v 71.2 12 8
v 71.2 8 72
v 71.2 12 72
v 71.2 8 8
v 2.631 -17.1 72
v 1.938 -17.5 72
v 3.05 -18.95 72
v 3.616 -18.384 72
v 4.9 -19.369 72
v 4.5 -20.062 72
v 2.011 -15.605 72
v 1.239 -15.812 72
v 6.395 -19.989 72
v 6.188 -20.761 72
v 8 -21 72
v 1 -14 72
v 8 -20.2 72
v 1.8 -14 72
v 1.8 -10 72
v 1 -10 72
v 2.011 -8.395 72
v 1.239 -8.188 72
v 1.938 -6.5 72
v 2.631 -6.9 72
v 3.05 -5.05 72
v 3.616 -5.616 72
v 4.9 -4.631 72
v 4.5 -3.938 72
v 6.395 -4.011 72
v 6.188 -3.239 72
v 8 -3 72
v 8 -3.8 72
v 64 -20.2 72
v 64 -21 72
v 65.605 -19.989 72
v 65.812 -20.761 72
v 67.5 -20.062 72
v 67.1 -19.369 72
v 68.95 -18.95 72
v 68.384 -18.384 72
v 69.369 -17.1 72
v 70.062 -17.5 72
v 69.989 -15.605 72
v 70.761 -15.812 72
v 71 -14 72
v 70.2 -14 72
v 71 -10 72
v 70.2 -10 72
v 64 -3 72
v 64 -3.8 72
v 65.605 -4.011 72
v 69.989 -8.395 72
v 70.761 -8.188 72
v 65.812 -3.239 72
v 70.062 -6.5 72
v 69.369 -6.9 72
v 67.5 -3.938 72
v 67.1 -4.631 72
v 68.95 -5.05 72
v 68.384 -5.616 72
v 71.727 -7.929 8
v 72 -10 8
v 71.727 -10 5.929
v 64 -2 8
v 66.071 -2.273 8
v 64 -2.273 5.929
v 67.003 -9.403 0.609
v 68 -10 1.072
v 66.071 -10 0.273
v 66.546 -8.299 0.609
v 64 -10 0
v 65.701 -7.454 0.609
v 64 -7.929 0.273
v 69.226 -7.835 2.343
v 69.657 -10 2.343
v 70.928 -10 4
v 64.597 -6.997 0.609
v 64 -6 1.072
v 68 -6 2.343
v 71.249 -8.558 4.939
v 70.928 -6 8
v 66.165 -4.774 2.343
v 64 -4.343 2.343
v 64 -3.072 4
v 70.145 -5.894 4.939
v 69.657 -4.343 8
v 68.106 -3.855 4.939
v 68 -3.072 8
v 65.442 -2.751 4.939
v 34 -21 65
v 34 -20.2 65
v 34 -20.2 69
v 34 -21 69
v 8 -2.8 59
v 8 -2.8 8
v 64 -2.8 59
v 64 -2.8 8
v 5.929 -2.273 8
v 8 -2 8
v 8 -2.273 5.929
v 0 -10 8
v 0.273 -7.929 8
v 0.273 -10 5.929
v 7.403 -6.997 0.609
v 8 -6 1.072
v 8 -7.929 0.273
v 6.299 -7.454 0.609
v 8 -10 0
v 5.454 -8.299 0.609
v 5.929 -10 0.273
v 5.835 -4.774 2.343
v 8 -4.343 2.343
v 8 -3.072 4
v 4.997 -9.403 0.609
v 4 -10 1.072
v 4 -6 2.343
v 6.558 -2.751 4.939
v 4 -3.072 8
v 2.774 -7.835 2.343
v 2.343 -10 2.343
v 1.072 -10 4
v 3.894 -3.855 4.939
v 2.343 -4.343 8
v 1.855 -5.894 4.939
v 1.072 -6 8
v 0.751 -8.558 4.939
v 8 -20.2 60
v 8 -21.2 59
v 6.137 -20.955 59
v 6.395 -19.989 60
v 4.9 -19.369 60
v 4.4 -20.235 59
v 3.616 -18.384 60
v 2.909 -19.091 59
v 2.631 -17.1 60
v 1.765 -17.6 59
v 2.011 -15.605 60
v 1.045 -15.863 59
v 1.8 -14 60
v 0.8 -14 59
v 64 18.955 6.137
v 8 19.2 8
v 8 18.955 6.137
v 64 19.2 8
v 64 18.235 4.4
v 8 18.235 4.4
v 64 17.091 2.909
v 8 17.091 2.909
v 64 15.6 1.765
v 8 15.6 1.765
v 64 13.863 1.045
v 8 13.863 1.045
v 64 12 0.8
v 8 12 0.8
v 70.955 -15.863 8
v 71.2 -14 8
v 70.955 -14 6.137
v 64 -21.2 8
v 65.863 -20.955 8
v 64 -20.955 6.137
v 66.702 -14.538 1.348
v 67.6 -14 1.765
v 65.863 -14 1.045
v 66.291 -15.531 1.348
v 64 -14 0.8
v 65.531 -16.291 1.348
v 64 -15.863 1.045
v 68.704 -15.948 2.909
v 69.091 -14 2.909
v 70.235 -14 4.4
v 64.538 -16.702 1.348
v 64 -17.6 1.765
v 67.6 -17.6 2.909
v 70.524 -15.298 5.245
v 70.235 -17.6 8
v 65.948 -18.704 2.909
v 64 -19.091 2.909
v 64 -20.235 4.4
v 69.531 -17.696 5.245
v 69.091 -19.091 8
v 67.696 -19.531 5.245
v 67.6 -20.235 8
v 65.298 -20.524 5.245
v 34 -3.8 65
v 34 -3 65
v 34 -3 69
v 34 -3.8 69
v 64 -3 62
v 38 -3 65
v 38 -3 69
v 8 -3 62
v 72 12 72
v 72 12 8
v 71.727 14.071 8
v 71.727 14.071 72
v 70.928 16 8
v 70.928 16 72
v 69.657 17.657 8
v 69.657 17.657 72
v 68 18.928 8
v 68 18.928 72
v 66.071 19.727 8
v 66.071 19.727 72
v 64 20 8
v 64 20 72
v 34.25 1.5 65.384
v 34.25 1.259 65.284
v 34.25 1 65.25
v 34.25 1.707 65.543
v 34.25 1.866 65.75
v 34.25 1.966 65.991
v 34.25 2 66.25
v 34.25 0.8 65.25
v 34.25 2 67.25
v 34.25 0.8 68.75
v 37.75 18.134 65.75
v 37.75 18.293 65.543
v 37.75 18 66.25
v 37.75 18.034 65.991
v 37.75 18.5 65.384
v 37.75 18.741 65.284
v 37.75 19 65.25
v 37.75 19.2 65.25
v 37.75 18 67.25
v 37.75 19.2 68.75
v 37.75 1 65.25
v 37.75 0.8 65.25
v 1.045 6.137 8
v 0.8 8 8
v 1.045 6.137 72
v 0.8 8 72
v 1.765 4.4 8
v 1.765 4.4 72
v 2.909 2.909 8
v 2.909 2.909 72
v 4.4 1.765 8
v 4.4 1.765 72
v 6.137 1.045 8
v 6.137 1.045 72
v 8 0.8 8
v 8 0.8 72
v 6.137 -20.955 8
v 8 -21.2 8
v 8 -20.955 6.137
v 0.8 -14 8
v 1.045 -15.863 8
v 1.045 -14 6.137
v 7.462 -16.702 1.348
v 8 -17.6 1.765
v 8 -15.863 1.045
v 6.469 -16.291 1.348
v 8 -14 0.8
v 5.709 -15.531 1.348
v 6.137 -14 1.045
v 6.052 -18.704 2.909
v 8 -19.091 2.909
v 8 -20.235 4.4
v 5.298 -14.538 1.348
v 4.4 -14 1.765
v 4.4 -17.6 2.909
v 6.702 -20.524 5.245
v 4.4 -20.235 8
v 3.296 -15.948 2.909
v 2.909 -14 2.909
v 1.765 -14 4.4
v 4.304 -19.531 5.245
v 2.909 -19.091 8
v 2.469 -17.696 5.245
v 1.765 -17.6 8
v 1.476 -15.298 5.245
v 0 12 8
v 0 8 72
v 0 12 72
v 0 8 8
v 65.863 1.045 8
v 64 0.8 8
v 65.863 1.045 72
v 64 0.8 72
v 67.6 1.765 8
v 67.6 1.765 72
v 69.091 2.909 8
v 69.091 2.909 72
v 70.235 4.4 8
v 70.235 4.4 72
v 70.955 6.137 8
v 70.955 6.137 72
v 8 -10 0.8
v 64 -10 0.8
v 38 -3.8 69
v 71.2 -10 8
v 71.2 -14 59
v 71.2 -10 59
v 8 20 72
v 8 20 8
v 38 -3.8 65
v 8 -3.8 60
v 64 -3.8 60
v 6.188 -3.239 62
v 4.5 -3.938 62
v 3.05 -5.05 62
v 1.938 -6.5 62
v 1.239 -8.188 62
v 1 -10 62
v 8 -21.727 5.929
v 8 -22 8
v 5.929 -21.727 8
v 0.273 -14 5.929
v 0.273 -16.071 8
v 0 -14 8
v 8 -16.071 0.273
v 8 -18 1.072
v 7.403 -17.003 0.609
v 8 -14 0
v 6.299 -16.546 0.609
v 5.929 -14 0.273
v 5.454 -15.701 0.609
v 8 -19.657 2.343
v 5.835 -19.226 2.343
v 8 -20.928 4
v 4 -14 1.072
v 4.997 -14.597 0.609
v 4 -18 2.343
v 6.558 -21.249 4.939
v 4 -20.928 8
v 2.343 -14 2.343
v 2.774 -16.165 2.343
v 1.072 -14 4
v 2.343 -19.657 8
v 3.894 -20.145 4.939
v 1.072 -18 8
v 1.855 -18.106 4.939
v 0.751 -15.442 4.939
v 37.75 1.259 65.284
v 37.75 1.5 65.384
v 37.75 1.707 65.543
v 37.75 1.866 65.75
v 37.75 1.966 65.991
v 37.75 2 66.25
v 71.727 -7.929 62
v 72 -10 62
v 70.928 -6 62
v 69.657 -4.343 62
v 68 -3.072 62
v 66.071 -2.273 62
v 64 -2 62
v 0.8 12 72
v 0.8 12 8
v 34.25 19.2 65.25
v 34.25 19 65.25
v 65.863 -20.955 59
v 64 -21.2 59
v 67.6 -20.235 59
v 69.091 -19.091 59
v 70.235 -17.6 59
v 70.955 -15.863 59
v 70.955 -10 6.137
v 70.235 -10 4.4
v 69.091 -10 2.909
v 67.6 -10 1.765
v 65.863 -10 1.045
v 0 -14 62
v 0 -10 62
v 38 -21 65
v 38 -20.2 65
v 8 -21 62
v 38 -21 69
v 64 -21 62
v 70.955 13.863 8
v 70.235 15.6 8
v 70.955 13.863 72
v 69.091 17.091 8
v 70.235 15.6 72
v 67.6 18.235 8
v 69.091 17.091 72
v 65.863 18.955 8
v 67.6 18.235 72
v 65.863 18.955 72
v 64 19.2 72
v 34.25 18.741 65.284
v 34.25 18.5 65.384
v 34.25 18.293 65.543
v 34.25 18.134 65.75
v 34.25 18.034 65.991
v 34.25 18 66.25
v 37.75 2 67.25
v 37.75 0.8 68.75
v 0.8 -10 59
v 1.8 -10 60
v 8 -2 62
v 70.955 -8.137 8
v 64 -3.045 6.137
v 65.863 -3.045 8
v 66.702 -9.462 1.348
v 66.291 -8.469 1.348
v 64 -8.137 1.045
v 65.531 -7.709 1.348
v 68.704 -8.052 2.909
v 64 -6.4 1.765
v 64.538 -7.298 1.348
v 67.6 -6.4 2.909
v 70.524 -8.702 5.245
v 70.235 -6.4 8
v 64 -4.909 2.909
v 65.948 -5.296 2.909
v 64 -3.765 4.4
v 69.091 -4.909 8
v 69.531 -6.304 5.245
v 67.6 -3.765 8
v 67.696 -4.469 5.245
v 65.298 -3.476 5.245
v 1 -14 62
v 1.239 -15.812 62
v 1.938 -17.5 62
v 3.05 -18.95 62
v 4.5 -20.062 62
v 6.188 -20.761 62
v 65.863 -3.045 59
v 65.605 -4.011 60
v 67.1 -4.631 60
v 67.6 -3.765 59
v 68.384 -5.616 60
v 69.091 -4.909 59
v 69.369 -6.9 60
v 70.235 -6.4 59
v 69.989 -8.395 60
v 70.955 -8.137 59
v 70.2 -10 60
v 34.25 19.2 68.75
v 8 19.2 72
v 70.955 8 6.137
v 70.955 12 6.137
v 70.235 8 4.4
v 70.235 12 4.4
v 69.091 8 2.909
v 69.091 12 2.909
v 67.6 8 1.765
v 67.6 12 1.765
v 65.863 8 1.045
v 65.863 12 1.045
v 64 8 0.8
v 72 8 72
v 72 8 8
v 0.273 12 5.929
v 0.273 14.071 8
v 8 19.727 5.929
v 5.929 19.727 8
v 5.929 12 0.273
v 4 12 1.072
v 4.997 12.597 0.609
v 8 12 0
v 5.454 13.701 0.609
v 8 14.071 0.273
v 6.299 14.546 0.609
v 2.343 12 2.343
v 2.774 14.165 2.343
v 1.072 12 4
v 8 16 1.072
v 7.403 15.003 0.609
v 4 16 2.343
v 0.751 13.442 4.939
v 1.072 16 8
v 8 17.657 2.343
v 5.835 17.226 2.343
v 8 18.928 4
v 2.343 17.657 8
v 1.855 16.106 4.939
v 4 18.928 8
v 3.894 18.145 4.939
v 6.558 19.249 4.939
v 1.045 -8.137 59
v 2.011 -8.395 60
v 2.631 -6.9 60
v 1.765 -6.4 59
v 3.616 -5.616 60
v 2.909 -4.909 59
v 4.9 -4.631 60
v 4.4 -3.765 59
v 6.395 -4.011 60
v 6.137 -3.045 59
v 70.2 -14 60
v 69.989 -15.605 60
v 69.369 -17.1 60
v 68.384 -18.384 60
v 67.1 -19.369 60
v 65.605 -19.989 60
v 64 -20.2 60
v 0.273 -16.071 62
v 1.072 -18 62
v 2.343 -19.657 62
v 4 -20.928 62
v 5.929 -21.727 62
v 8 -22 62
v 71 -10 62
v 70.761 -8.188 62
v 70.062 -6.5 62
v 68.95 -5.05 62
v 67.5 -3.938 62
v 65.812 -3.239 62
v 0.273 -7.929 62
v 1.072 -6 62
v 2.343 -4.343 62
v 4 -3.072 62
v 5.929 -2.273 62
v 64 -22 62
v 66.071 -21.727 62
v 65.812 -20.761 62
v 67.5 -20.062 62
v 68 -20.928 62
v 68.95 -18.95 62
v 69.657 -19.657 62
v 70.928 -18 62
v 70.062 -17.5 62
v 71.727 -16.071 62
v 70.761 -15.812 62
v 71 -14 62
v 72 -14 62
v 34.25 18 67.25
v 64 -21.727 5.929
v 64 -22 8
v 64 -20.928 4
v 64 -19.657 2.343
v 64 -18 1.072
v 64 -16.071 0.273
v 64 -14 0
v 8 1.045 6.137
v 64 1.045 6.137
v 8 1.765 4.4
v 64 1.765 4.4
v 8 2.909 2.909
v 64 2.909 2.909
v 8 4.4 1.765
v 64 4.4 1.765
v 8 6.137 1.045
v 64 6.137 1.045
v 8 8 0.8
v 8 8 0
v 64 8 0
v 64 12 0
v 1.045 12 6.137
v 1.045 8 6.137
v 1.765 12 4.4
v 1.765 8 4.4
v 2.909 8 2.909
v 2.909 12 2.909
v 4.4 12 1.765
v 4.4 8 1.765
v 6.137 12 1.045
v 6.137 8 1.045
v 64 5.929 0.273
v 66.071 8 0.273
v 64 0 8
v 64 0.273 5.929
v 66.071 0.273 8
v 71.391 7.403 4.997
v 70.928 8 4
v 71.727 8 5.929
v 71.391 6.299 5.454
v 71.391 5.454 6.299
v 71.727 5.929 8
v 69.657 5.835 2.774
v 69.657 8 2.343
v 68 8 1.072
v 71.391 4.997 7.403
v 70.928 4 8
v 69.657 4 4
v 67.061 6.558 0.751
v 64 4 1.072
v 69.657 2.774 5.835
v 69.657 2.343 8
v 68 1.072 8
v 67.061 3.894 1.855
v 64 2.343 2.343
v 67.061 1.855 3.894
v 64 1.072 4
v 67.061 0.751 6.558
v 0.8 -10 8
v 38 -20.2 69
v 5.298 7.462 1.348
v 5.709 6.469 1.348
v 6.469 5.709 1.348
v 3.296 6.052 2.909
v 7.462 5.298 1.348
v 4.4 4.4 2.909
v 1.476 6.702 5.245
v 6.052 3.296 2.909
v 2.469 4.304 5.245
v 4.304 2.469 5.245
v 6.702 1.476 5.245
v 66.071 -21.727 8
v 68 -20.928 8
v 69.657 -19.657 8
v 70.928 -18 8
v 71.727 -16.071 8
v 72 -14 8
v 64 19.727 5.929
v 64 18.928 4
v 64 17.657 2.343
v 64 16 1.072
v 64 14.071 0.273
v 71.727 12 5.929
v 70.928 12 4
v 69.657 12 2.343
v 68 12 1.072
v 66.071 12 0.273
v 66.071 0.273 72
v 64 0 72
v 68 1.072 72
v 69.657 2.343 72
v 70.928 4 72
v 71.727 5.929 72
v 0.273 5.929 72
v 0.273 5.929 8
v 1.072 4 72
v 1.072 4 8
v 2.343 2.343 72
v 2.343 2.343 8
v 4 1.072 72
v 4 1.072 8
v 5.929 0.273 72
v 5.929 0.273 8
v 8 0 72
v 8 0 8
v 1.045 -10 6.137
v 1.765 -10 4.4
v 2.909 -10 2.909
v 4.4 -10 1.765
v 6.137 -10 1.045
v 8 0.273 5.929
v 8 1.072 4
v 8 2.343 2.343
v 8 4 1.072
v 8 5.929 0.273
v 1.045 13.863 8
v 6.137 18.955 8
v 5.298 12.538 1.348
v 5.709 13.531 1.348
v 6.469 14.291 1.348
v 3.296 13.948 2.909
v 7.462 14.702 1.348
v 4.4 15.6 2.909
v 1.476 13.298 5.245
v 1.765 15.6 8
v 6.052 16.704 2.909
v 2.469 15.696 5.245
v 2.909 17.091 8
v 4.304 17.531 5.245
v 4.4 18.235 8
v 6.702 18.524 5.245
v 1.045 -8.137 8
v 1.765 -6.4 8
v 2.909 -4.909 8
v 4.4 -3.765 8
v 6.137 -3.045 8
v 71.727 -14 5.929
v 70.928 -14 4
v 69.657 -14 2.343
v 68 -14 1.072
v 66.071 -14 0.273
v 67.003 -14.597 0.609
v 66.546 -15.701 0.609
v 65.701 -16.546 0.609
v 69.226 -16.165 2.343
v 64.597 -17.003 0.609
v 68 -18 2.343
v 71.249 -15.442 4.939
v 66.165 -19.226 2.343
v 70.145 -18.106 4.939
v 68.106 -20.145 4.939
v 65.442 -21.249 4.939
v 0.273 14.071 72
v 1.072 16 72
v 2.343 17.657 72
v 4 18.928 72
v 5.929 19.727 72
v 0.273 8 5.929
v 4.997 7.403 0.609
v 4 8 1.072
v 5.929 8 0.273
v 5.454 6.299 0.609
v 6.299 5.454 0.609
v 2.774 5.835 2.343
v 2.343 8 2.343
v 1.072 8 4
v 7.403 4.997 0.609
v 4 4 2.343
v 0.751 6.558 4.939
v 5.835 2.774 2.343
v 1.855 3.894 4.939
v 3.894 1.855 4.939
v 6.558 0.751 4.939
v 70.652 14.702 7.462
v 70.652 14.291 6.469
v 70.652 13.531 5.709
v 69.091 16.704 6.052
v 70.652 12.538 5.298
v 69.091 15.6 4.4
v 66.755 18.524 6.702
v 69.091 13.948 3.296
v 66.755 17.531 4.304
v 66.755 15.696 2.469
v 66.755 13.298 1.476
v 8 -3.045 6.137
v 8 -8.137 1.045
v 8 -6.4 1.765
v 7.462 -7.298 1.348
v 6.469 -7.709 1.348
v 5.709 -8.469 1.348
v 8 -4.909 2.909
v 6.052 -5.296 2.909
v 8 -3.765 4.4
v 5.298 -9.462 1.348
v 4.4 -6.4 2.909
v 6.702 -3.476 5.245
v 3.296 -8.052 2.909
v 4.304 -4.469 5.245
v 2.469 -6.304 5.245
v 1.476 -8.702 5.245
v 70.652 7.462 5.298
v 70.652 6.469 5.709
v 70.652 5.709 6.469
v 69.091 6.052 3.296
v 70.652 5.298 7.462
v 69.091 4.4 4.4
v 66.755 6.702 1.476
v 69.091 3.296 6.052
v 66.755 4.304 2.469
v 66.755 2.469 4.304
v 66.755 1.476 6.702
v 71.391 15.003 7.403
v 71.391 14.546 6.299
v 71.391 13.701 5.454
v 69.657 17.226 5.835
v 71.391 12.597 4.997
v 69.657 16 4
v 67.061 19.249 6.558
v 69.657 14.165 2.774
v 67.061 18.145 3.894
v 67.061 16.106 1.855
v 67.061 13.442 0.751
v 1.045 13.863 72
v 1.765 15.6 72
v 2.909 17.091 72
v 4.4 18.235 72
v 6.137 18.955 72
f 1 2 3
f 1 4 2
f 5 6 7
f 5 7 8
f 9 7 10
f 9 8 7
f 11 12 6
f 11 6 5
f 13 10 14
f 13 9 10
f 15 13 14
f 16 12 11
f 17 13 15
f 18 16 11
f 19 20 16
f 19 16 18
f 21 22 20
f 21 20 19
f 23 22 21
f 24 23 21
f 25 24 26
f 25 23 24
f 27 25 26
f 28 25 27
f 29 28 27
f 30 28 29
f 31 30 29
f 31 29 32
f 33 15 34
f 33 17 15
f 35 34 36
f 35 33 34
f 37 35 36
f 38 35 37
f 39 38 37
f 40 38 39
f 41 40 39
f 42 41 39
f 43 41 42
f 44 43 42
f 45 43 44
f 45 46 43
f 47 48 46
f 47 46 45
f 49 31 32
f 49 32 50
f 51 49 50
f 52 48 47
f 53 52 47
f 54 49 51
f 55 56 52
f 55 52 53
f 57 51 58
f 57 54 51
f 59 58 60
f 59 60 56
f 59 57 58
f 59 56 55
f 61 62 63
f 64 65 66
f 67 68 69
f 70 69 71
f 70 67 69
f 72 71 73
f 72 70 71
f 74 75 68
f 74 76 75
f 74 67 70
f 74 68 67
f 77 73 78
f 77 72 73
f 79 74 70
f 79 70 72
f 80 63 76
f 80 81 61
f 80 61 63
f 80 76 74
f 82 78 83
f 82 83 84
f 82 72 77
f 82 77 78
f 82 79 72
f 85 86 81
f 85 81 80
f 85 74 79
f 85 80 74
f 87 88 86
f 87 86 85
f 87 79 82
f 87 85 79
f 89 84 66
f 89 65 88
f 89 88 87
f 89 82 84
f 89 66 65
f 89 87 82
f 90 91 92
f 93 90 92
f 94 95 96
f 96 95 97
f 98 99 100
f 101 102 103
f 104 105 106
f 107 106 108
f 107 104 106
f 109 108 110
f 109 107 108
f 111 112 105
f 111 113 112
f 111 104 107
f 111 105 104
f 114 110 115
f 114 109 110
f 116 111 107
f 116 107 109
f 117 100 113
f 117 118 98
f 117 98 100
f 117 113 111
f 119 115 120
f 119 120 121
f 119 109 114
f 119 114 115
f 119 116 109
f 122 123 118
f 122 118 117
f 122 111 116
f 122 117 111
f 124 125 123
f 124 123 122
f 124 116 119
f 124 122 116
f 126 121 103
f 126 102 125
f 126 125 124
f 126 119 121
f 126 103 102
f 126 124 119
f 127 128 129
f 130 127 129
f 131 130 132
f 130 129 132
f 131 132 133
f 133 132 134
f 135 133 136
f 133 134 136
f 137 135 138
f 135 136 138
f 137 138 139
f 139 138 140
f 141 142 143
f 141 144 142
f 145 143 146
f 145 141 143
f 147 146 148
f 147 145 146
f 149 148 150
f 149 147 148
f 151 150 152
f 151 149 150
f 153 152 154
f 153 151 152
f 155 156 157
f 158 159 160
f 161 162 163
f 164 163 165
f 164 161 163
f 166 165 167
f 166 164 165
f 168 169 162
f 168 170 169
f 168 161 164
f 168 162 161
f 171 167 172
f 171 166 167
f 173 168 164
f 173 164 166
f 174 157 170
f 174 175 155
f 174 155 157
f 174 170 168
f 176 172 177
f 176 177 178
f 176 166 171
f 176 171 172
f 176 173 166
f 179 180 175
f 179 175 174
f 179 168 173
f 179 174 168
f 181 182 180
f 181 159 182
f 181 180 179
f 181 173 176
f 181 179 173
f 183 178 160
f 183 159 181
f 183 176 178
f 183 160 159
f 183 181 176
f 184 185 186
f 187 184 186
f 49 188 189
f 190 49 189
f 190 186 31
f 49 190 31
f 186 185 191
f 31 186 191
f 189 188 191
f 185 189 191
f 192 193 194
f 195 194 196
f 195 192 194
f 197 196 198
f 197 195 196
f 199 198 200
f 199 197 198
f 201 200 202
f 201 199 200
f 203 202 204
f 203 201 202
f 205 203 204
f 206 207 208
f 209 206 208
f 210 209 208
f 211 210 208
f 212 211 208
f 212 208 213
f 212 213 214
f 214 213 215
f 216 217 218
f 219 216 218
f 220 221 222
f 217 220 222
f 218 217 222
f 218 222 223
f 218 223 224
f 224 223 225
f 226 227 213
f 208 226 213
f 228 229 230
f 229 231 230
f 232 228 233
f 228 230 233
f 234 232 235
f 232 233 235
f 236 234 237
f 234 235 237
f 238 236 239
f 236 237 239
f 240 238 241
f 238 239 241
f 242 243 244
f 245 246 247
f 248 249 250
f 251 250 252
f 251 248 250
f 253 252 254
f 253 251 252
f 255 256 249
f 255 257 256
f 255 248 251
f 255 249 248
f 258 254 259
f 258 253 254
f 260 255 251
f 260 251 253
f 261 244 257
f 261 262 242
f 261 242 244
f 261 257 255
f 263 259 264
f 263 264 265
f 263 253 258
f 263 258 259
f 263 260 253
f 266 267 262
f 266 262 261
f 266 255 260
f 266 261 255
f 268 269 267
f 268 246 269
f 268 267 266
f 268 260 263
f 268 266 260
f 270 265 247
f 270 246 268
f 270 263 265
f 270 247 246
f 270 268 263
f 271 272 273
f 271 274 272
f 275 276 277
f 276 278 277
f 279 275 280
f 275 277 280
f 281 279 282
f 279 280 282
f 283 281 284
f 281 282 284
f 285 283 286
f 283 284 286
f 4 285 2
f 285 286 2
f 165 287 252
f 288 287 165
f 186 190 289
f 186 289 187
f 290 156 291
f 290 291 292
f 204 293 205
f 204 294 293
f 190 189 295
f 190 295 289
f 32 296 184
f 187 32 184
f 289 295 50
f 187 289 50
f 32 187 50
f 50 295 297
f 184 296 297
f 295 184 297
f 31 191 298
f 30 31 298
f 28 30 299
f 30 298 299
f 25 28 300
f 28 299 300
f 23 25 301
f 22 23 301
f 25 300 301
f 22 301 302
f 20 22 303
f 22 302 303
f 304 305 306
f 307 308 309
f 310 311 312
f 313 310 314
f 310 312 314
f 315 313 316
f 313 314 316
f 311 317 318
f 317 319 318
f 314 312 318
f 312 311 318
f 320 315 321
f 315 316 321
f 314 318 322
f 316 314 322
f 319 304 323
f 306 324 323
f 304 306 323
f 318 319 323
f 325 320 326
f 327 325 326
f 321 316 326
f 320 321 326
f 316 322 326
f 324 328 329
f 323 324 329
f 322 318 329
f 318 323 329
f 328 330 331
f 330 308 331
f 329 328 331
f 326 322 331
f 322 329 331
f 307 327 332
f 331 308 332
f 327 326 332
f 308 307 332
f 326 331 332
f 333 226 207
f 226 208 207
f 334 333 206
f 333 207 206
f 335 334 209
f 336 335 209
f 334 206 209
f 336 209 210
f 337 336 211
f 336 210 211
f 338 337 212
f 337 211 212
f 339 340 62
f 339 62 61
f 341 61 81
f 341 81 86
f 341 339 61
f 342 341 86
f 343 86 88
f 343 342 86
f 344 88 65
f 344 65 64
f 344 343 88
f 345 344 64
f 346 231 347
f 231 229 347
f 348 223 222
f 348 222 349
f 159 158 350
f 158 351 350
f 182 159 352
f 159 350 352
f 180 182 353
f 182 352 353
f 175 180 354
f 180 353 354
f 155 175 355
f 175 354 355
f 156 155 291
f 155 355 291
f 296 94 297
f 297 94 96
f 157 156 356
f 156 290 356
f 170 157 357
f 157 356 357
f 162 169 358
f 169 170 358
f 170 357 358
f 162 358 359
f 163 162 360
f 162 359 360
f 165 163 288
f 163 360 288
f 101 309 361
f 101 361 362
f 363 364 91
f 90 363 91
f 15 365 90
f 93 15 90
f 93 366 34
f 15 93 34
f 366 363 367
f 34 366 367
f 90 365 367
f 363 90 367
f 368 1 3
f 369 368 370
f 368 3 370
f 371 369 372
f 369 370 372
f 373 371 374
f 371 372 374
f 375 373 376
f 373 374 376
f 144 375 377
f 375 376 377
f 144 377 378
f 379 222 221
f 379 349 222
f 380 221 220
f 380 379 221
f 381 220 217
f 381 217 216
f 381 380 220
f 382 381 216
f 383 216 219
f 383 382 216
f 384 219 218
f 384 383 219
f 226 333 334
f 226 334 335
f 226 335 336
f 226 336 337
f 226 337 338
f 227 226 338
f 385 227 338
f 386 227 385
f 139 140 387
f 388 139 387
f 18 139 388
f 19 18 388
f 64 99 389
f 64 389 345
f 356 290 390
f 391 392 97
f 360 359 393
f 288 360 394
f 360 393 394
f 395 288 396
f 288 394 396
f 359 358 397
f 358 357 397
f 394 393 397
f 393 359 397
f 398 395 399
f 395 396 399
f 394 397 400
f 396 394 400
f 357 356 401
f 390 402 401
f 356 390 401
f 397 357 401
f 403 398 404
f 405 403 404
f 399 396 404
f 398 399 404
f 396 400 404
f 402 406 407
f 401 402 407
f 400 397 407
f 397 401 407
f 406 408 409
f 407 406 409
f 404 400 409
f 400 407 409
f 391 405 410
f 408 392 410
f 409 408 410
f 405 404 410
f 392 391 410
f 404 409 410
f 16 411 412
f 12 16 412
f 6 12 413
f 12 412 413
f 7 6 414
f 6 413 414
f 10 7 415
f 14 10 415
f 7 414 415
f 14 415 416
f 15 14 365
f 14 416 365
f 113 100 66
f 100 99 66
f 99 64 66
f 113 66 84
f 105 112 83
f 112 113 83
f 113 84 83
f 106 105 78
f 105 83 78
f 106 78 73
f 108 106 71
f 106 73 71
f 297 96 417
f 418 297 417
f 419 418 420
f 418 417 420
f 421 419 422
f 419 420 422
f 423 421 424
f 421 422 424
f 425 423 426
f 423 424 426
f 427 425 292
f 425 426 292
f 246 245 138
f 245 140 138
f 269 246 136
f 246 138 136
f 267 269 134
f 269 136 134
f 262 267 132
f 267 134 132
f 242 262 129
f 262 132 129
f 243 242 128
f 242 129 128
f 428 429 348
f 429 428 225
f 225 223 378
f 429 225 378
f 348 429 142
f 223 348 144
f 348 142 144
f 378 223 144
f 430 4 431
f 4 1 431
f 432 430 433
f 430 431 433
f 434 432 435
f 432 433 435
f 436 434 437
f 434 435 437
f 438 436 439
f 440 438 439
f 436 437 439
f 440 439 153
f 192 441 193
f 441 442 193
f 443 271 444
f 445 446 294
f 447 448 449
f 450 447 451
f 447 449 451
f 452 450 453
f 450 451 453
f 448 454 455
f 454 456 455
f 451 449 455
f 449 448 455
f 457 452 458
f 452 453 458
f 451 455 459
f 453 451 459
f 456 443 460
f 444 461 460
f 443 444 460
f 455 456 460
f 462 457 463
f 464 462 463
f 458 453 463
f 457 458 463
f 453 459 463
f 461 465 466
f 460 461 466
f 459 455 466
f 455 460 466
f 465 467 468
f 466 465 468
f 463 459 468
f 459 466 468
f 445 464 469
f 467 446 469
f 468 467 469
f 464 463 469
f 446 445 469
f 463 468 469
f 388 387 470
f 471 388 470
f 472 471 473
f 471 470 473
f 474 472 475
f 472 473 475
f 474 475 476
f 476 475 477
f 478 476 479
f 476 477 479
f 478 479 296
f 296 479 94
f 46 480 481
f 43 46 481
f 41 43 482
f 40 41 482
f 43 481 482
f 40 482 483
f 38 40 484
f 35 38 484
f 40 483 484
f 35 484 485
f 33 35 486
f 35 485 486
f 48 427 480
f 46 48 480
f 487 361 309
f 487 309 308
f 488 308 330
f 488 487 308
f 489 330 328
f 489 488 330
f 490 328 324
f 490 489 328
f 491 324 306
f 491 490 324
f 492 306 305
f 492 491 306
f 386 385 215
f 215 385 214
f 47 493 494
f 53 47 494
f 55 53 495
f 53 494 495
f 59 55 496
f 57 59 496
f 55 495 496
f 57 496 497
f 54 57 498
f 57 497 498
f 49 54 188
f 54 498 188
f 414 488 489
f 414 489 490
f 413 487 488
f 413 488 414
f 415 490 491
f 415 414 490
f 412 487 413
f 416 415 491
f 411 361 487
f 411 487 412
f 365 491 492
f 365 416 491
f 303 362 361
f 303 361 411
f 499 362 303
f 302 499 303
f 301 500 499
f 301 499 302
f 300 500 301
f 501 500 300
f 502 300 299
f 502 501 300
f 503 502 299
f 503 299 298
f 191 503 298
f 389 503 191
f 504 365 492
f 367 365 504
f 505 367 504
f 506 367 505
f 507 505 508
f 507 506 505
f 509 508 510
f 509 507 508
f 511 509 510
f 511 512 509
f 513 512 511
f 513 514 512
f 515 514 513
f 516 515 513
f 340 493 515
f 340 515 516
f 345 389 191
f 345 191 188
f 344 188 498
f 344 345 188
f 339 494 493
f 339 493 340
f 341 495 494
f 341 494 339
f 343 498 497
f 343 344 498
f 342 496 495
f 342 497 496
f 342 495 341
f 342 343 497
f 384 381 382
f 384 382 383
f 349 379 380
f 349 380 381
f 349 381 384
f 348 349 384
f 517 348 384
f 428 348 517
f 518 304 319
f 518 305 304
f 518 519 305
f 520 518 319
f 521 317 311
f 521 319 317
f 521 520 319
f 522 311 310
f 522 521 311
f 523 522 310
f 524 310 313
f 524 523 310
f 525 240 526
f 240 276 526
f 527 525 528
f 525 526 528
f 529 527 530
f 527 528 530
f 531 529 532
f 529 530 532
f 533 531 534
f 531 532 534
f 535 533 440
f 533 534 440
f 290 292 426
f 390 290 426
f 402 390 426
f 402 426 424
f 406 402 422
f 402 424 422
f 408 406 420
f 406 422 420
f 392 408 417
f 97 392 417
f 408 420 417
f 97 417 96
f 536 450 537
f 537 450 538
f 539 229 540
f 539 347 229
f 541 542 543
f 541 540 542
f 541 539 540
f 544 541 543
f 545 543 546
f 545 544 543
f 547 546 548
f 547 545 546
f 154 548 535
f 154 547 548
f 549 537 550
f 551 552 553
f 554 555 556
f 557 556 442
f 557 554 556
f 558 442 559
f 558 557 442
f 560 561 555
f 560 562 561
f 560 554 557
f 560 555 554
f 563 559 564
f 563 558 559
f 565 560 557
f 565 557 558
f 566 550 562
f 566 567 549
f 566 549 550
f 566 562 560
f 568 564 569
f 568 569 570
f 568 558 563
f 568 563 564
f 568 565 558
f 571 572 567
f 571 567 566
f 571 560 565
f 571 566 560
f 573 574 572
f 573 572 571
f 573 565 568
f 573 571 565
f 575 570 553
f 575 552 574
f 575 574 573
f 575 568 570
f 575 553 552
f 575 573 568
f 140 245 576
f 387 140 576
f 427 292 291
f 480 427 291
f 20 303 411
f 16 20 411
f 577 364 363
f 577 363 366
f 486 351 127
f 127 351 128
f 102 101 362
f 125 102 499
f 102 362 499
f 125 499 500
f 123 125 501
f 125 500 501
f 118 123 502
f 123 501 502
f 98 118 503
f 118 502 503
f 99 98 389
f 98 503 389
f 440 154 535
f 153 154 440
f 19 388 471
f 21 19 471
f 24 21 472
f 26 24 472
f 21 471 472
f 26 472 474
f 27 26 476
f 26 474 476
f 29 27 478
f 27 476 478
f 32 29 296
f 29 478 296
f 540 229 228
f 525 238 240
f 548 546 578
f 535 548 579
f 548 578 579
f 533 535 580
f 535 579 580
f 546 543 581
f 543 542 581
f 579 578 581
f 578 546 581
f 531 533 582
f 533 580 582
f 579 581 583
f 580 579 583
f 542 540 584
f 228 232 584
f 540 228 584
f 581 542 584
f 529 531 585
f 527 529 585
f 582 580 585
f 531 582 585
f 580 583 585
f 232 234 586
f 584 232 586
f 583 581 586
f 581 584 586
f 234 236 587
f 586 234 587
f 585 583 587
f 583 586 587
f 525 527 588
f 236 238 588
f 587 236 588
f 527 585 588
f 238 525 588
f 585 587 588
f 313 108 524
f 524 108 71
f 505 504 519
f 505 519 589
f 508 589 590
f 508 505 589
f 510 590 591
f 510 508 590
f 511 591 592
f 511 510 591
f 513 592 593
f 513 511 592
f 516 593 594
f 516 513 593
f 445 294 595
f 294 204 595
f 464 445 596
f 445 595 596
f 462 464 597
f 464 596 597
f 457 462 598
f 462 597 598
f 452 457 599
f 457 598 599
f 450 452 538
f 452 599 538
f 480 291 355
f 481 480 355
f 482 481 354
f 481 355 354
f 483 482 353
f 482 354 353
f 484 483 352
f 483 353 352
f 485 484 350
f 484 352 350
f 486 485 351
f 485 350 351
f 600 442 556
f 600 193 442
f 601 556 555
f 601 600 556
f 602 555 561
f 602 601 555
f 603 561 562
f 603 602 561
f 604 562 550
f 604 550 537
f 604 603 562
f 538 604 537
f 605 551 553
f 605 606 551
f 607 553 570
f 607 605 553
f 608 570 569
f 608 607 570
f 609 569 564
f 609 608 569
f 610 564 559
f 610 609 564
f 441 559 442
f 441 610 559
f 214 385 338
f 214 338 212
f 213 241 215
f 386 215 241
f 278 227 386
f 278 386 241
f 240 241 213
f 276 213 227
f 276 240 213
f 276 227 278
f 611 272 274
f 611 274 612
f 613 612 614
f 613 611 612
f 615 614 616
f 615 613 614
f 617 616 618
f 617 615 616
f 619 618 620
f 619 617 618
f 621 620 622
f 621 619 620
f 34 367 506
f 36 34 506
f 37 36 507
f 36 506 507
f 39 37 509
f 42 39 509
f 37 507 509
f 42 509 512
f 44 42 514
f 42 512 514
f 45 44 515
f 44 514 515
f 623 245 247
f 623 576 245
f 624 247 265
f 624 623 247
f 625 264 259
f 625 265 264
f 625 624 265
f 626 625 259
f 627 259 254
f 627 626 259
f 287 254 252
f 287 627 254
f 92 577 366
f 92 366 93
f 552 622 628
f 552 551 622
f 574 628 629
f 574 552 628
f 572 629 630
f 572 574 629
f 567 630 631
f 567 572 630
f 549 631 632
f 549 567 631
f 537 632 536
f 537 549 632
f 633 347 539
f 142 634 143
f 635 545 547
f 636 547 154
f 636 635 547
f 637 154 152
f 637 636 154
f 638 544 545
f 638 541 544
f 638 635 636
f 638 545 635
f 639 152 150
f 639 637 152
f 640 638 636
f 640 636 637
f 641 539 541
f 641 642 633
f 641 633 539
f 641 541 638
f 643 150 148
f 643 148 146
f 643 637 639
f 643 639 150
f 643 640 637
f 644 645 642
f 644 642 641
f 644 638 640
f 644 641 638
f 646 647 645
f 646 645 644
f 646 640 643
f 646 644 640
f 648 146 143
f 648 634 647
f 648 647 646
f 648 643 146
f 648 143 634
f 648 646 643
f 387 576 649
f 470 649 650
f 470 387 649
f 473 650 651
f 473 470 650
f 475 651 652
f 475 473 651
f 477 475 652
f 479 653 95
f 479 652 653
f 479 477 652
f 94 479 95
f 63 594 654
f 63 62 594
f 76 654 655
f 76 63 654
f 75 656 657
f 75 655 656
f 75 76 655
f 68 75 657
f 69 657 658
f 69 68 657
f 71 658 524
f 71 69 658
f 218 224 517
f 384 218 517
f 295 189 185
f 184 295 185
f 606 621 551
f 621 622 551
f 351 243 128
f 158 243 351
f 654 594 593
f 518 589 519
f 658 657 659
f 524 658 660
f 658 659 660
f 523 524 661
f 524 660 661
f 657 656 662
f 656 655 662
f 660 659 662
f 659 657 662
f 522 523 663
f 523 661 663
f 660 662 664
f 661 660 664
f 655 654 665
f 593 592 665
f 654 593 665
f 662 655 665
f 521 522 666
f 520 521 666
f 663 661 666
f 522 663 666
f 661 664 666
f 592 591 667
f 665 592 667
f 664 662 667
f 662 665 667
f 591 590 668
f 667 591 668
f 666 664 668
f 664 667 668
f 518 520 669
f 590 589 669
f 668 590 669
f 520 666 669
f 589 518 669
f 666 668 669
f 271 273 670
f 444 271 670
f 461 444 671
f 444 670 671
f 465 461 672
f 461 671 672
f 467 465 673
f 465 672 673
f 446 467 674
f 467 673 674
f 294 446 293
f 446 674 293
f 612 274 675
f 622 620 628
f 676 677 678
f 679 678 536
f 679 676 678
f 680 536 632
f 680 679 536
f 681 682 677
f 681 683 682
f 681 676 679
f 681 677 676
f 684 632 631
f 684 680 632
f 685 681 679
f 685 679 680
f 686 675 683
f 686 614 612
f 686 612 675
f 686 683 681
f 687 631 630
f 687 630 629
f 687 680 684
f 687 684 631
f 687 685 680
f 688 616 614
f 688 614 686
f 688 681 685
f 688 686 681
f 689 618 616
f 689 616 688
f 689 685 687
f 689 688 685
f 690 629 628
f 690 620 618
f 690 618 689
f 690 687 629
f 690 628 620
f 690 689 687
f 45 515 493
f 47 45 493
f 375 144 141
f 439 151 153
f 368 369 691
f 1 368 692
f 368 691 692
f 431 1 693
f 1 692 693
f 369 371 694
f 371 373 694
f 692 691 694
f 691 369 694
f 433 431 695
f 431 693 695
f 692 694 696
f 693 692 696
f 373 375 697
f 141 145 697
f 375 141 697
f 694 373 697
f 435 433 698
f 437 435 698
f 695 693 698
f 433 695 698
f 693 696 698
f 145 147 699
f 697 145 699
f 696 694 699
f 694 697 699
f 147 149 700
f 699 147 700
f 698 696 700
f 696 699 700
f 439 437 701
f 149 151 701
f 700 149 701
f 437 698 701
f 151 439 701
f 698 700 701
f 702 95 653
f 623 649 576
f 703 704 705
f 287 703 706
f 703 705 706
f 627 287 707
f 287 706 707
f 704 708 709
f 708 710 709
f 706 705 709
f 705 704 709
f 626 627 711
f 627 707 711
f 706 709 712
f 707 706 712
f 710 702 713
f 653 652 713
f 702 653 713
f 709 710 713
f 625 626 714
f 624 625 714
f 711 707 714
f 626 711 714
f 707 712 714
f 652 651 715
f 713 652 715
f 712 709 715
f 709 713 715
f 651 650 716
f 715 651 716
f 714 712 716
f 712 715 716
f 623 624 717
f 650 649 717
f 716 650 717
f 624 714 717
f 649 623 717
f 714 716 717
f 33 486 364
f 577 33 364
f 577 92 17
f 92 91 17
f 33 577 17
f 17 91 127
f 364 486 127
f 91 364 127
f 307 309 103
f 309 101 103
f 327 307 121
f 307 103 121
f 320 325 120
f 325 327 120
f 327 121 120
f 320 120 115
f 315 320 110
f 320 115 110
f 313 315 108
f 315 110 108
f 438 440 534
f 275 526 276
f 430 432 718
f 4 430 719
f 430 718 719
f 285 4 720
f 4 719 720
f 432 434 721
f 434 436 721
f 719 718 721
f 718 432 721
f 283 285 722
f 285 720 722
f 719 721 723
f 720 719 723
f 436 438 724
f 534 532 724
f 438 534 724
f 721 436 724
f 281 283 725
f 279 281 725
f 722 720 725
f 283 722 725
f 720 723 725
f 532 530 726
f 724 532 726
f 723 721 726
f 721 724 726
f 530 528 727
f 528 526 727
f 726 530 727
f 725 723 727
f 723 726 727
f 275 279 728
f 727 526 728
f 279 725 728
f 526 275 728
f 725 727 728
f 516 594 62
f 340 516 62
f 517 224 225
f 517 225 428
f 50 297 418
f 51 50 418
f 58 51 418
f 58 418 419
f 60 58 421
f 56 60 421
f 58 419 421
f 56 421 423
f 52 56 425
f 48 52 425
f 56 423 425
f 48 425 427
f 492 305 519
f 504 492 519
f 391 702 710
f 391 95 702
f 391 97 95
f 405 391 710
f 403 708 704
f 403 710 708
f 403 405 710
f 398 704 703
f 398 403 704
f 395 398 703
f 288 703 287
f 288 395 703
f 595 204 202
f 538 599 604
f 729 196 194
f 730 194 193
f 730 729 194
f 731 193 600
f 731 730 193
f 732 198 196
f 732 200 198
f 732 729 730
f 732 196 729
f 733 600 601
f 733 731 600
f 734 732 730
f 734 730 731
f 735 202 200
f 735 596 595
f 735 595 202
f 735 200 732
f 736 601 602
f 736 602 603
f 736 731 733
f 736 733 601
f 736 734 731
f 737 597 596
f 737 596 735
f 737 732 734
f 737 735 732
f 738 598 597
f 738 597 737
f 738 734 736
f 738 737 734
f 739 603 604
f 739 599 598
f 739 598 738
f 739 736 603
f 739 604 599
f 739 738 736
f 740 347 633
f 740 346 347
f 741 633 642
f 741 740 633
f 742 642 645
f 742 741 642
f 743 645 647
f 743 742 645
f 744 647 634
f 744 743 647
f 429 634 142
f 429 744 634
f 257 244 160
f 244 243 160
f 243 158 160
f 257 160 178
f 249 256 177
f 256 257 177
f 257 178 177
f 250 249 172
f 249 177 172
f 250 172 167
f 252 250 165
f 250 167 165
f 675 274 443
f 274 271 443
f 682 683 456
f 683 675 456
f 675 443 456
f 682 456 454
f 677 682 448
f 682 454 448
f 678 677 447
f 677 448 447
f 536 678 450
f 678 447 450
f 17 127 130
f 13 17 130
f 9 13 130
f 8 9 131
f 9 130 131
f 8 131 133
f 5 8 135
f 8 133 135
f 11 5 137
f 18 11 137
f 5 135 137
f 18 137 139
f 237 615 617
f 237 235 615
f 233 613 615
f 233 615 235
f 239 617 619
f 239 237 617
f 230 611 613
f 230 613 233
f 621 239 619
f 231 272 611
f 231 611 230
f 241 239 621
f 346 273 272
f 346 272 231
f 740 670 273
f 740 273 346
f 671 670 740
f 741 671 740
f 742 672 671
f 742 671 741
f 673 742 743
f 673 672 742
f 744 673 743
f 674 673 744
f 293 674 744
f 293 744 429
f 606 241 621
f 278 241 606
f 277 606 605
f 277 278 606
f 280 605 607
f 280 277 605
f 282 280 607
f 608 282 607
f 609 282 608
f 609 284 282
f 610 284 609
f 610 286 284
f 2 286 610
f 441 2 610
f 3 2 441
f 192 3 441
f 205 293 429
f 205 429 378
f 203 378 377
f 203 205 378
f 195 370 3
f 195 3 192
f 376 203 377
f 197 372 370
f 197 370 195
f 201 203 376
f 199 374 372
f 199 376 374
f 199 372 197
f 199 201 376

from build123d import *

# Parameters (mm, degrees)
F0_W      = 72
F0_H      = 20
F1_DEPTH  = 72
F2_R      = 8
F2_2_R    = 8
F3_T      = -0.8
F3_2_T    = -0.8
F4_W      = 3.5
F4_H      = 3.5
F5_DEPTH  = 1.2
F6_R      = 1
F7_SIZE2  = 1.49999
F7_SIZE   = 1.19999
F10_DEPTH = 10
F12_DEPTH = 3
F14_DEPTH = 10
F15_W     = 4
F15_H     = 4
F16_DEPTH = 25
F17_SIZE  = 0.99999


# Not quite as in the source:
# - a fillet or chamfer is up to 0.001 mm smaller than in the source, because OpenCascade refuses the exact size


with BuildPart() as f1:
    # F0 (on Top) → F1 (new body)
    with BuildSketch(Plane.XY):
        with Locations((36, 10)):
            Rectangle(F0_W, F0_H)
    extrude(amount=F1_DEPTH)

    # F2
    f2_edges = [f1.edges().sort_by_distance(p)[0] for p in [
        (0, 20, 36),
        (0, 0, 36),
        (0, 10, 0),
        (36, 20, 0),
        (36, 0, 0),
        (72, 20, 36),
        (72, 10, 0),
        (72, 0, 36),
    ]]
    fillet(f2_edges, radius=F2_R)

    # F3
    f3_openings = [f1.faces().sort_by_distance(p)[0] for p in [
        (36, 10, 72),
    ]]
    offset(amount=F3_T, openings=f3_openings)

    # F4 (on face) → F5 (join)
    with BuildSketch(Plane(origin=(0, 0.8, 0), x_dir=(-1, 0, 0), z_dir=(0, 1, 0))):
        with Locations((-36, 67)):
            Rectangle(F4_W, F4_H)
    extrude(amount=F5_DEPTH)

    # F6
    f6_edges = [f1.edges().sort_by_distance(p)[0] for p in [
        (36, 2, 65.25),
    ]]
    fillet(f6_edges, radius=F6_R)

    # F7 (size 1.2 and 1.5 in the source; OpenCascade refuses exactly that, so slightly less here)
    f7_edges = [f1.edges().sort_by_distance(p)[0] for p in [
        (36, 2, 68.75),
    ]]
    f7_side = f1.faces().sort_by_distance((36, 1.4, 68.75))[0]
    chamfer(f7_edges, length=F7_SIZE, length2=F7_SIZE2, reference=f7_side)

    # F9: F1 across plane


with BuildPart() as f1b:
    # F0 (on Top) → F1, piece 2 (new body)
    with BuildSketch(Plane.XY):
        with Locations((36, -12)):
            Rectangle(F0_W, F0_H)
    extrude(amount=F1_DEPTH)

    # F2#2
    f2_2_edges = [f1b.edges().sort_by_distance(p)[0] for p in [
        (0, -2, 36),
        (0, -22, 36),
        (72, -22, 36),
        (72, -2, 36),
        (72, -12, 0),
        (36, -2, 0),
        (36, -22, 0),
        (0, -12, 0),
    ]]
    fillet(f2_2_edges, radius=F2_2_R)

    # F3#2
    f3_2_openings = [f1b.faces().sort_by_distance(p)[0] for p in [
        (36, -12, 72),
    ]]
    offset(amount=F3_2_T, openings=f3_2_openings)

    # F10 (cut): a face of the model
    f10_faces = [f1b.faces().sort_by_distance(p)[0] for p in [
        (36, -2.7472616677, 72),
    ]]
    extrude(f10_faces, amount=-F10_DEPTH, mode=Mode.SUBTRACT)

    # F11 (on face) → F12 (join)
    with BuildSketch(Plane.XY.offset(62)):
        with BuildLine():
            ThreePointArc((72, -10), (69.6568542495, -4.3431457505), (64, -2))
            Line((64, -2), (8, -2))
            ThreePointArc((8, -2), (2.3431457505, -4.3431457505), (0, -10))
            Line((0, -10), (0, -14))
            ThreePointArc((0, -14), (2.3431457505, -19.6568542495), (8, -22))
            Line((8, -22), (64, -22))
            ThreePointArc((64, -22), (69.6568542495, -19.6568542495), (72, -14))
            Line((72, -14), (72, -10))
        make_face()
        with BuildLine():
            ThreePointArc((0.8, -10), (2.9088311755, -4.9088311755), (8, -2.8))
            Line((8, -2.8), (64, -2.8))
            ThreePointArc((64, -2.8), (69.0911688245, -4.9088311755), (71.2, -10))
            Line((71.2, -10), (71.2, -14))
            ThreePointArc((71.2, -14), (69.0911688245, -19.0911688245), (64, -21.2))
            Line((64, -21.2), (8, -21.2))
            ThreePointArc((8, -21.2), (2.9088311755, -19.0911688245), (0.8, -14))
            Line((0.8, -14), (0.8, -10))
        make_face(mode=Mode.SUBTRACT)
        with BuildLine():
            Line((64, -2.8), (8, -2.8))
            ThreePointArc((8, -2.8), (2.9088311755, -4.9088311755), (0.8, -10))
            Line((0.8, -10), (0.8, -14))
            ThreePointArc((0.8, -14), (2.9088311755, -19.0911688245), (8, -21.2))
            Line((8, -21.2), (64, -21.2))
            ThreePointArc((64, -21.2), (69.0911688245, -19.0911688245), (71.2, -14))
            Line((71.2, -14), (71.2, -10))
            ThreePointArc((71.2, -10), (69.0911688245, -4.9088311755), (64, -2.8))
        make_face()
        with BuildLine():
            ThreePointArc((1.8, -10), (3.6159379566, -5.6159379566), (8, -3.8))
            Line((8, -3.8), (64, -3.8))
            ThreePointArc((64, -3.8), (68.3840620434, -5.6159379566), (70.2, -10))
            Line((70.2, -10), (70.2, -14))
            ThreePointArc((70.2, -14), (68.3840620434, -18.3840620434), (64, -20.2))
            Line((64, -20.2), (8, -20.2))
            ThreePointArc((8, -20.2), (3.6159379566, -18.3840620434), (1.8, -14))
            Line((1.8, -14), (1.8, -10))
        make_face(mode=Mode.SUBTRACT)
    extrude(amount=-F12_DEPTH)

    # F13 (on face) → F14 (join)
    with BuildSketch(Plane.XY.offset(62)):
        with BuildLine():
            Line((64, -3), (8, -3))
            ThreePointArc((8, -3), (3.0502525317, -5.0502525317), (1, -10))
            Line((1, -10), (1, -14))
            ThreePointArc((1, -14), (3.0502525317, -18.9497474683), (8, -21))
            Line((8, -21), (64, -21))
            ThreePointArc((64, -21), (68.9497474683, -18.9497474683), (71, -14))
            Line((71, -14), (71, -10))
            ThreePointArc((71, -10), (68.9497474683, -5.0502525317), (64, -3))
        make_face()
        with BuildLine():
            ThreePointArc((1.8, -10), (3.6159379566, -5.6159379566), (8, -3.8))
            Line((8, -3.8), (64, -3.8))
            ThreePointArc((64, -3.8), (68.3840620434, -5.6159379566), (70.2, -10))
            Line((70.2, -10), (70.2, -14))
            ThreePointArc((70.2, -14), (68.3840620434, -18.3840620434), (64, -20.2))
            Line((64, -20.2), (8, -20.2))
            ThreePointArc((8, -20.2), (3.6159379566, -18.3840620434), (1.8, -14))
            Line((1.8, -14), (1.8, -10))
        make_face(mode=Mode.SUBTRACT)
    extrude(amount=F14_DEPTH)

    # F15 (on face) → F16 (cut)
    with BuildSketch(Plane(origin=(0, -3, 0), x_dir=(-1, 0, 0), z_dir=(0, 1, 0))):
        with Locations((-36, 67)):
            Rectangle(F15_W, F15_H)
    extrude(amount=-F16_DEPTH, mode=Mode.SUBTRACT)

    # F17 (size 1 in the source; OpenCascade refuses exactly that, so slightly less here)
    f17_edges = [f1b.edges().sort_by_distance(p)[0] for p in [
        (36, -20.2, 59),
    ]]
    chamfer(f17_edges, length=F17_SIZE)


with BuildPart() as f1_1:
    add(f1.part)
    add(f1.part.mirror(Plane(origin=(36, 10, 39.9536991671), x_dir=(1, 0, 0), z_dir=(0, -1, 0))))


solid = Compound([f1b.part, f1_1.part])
